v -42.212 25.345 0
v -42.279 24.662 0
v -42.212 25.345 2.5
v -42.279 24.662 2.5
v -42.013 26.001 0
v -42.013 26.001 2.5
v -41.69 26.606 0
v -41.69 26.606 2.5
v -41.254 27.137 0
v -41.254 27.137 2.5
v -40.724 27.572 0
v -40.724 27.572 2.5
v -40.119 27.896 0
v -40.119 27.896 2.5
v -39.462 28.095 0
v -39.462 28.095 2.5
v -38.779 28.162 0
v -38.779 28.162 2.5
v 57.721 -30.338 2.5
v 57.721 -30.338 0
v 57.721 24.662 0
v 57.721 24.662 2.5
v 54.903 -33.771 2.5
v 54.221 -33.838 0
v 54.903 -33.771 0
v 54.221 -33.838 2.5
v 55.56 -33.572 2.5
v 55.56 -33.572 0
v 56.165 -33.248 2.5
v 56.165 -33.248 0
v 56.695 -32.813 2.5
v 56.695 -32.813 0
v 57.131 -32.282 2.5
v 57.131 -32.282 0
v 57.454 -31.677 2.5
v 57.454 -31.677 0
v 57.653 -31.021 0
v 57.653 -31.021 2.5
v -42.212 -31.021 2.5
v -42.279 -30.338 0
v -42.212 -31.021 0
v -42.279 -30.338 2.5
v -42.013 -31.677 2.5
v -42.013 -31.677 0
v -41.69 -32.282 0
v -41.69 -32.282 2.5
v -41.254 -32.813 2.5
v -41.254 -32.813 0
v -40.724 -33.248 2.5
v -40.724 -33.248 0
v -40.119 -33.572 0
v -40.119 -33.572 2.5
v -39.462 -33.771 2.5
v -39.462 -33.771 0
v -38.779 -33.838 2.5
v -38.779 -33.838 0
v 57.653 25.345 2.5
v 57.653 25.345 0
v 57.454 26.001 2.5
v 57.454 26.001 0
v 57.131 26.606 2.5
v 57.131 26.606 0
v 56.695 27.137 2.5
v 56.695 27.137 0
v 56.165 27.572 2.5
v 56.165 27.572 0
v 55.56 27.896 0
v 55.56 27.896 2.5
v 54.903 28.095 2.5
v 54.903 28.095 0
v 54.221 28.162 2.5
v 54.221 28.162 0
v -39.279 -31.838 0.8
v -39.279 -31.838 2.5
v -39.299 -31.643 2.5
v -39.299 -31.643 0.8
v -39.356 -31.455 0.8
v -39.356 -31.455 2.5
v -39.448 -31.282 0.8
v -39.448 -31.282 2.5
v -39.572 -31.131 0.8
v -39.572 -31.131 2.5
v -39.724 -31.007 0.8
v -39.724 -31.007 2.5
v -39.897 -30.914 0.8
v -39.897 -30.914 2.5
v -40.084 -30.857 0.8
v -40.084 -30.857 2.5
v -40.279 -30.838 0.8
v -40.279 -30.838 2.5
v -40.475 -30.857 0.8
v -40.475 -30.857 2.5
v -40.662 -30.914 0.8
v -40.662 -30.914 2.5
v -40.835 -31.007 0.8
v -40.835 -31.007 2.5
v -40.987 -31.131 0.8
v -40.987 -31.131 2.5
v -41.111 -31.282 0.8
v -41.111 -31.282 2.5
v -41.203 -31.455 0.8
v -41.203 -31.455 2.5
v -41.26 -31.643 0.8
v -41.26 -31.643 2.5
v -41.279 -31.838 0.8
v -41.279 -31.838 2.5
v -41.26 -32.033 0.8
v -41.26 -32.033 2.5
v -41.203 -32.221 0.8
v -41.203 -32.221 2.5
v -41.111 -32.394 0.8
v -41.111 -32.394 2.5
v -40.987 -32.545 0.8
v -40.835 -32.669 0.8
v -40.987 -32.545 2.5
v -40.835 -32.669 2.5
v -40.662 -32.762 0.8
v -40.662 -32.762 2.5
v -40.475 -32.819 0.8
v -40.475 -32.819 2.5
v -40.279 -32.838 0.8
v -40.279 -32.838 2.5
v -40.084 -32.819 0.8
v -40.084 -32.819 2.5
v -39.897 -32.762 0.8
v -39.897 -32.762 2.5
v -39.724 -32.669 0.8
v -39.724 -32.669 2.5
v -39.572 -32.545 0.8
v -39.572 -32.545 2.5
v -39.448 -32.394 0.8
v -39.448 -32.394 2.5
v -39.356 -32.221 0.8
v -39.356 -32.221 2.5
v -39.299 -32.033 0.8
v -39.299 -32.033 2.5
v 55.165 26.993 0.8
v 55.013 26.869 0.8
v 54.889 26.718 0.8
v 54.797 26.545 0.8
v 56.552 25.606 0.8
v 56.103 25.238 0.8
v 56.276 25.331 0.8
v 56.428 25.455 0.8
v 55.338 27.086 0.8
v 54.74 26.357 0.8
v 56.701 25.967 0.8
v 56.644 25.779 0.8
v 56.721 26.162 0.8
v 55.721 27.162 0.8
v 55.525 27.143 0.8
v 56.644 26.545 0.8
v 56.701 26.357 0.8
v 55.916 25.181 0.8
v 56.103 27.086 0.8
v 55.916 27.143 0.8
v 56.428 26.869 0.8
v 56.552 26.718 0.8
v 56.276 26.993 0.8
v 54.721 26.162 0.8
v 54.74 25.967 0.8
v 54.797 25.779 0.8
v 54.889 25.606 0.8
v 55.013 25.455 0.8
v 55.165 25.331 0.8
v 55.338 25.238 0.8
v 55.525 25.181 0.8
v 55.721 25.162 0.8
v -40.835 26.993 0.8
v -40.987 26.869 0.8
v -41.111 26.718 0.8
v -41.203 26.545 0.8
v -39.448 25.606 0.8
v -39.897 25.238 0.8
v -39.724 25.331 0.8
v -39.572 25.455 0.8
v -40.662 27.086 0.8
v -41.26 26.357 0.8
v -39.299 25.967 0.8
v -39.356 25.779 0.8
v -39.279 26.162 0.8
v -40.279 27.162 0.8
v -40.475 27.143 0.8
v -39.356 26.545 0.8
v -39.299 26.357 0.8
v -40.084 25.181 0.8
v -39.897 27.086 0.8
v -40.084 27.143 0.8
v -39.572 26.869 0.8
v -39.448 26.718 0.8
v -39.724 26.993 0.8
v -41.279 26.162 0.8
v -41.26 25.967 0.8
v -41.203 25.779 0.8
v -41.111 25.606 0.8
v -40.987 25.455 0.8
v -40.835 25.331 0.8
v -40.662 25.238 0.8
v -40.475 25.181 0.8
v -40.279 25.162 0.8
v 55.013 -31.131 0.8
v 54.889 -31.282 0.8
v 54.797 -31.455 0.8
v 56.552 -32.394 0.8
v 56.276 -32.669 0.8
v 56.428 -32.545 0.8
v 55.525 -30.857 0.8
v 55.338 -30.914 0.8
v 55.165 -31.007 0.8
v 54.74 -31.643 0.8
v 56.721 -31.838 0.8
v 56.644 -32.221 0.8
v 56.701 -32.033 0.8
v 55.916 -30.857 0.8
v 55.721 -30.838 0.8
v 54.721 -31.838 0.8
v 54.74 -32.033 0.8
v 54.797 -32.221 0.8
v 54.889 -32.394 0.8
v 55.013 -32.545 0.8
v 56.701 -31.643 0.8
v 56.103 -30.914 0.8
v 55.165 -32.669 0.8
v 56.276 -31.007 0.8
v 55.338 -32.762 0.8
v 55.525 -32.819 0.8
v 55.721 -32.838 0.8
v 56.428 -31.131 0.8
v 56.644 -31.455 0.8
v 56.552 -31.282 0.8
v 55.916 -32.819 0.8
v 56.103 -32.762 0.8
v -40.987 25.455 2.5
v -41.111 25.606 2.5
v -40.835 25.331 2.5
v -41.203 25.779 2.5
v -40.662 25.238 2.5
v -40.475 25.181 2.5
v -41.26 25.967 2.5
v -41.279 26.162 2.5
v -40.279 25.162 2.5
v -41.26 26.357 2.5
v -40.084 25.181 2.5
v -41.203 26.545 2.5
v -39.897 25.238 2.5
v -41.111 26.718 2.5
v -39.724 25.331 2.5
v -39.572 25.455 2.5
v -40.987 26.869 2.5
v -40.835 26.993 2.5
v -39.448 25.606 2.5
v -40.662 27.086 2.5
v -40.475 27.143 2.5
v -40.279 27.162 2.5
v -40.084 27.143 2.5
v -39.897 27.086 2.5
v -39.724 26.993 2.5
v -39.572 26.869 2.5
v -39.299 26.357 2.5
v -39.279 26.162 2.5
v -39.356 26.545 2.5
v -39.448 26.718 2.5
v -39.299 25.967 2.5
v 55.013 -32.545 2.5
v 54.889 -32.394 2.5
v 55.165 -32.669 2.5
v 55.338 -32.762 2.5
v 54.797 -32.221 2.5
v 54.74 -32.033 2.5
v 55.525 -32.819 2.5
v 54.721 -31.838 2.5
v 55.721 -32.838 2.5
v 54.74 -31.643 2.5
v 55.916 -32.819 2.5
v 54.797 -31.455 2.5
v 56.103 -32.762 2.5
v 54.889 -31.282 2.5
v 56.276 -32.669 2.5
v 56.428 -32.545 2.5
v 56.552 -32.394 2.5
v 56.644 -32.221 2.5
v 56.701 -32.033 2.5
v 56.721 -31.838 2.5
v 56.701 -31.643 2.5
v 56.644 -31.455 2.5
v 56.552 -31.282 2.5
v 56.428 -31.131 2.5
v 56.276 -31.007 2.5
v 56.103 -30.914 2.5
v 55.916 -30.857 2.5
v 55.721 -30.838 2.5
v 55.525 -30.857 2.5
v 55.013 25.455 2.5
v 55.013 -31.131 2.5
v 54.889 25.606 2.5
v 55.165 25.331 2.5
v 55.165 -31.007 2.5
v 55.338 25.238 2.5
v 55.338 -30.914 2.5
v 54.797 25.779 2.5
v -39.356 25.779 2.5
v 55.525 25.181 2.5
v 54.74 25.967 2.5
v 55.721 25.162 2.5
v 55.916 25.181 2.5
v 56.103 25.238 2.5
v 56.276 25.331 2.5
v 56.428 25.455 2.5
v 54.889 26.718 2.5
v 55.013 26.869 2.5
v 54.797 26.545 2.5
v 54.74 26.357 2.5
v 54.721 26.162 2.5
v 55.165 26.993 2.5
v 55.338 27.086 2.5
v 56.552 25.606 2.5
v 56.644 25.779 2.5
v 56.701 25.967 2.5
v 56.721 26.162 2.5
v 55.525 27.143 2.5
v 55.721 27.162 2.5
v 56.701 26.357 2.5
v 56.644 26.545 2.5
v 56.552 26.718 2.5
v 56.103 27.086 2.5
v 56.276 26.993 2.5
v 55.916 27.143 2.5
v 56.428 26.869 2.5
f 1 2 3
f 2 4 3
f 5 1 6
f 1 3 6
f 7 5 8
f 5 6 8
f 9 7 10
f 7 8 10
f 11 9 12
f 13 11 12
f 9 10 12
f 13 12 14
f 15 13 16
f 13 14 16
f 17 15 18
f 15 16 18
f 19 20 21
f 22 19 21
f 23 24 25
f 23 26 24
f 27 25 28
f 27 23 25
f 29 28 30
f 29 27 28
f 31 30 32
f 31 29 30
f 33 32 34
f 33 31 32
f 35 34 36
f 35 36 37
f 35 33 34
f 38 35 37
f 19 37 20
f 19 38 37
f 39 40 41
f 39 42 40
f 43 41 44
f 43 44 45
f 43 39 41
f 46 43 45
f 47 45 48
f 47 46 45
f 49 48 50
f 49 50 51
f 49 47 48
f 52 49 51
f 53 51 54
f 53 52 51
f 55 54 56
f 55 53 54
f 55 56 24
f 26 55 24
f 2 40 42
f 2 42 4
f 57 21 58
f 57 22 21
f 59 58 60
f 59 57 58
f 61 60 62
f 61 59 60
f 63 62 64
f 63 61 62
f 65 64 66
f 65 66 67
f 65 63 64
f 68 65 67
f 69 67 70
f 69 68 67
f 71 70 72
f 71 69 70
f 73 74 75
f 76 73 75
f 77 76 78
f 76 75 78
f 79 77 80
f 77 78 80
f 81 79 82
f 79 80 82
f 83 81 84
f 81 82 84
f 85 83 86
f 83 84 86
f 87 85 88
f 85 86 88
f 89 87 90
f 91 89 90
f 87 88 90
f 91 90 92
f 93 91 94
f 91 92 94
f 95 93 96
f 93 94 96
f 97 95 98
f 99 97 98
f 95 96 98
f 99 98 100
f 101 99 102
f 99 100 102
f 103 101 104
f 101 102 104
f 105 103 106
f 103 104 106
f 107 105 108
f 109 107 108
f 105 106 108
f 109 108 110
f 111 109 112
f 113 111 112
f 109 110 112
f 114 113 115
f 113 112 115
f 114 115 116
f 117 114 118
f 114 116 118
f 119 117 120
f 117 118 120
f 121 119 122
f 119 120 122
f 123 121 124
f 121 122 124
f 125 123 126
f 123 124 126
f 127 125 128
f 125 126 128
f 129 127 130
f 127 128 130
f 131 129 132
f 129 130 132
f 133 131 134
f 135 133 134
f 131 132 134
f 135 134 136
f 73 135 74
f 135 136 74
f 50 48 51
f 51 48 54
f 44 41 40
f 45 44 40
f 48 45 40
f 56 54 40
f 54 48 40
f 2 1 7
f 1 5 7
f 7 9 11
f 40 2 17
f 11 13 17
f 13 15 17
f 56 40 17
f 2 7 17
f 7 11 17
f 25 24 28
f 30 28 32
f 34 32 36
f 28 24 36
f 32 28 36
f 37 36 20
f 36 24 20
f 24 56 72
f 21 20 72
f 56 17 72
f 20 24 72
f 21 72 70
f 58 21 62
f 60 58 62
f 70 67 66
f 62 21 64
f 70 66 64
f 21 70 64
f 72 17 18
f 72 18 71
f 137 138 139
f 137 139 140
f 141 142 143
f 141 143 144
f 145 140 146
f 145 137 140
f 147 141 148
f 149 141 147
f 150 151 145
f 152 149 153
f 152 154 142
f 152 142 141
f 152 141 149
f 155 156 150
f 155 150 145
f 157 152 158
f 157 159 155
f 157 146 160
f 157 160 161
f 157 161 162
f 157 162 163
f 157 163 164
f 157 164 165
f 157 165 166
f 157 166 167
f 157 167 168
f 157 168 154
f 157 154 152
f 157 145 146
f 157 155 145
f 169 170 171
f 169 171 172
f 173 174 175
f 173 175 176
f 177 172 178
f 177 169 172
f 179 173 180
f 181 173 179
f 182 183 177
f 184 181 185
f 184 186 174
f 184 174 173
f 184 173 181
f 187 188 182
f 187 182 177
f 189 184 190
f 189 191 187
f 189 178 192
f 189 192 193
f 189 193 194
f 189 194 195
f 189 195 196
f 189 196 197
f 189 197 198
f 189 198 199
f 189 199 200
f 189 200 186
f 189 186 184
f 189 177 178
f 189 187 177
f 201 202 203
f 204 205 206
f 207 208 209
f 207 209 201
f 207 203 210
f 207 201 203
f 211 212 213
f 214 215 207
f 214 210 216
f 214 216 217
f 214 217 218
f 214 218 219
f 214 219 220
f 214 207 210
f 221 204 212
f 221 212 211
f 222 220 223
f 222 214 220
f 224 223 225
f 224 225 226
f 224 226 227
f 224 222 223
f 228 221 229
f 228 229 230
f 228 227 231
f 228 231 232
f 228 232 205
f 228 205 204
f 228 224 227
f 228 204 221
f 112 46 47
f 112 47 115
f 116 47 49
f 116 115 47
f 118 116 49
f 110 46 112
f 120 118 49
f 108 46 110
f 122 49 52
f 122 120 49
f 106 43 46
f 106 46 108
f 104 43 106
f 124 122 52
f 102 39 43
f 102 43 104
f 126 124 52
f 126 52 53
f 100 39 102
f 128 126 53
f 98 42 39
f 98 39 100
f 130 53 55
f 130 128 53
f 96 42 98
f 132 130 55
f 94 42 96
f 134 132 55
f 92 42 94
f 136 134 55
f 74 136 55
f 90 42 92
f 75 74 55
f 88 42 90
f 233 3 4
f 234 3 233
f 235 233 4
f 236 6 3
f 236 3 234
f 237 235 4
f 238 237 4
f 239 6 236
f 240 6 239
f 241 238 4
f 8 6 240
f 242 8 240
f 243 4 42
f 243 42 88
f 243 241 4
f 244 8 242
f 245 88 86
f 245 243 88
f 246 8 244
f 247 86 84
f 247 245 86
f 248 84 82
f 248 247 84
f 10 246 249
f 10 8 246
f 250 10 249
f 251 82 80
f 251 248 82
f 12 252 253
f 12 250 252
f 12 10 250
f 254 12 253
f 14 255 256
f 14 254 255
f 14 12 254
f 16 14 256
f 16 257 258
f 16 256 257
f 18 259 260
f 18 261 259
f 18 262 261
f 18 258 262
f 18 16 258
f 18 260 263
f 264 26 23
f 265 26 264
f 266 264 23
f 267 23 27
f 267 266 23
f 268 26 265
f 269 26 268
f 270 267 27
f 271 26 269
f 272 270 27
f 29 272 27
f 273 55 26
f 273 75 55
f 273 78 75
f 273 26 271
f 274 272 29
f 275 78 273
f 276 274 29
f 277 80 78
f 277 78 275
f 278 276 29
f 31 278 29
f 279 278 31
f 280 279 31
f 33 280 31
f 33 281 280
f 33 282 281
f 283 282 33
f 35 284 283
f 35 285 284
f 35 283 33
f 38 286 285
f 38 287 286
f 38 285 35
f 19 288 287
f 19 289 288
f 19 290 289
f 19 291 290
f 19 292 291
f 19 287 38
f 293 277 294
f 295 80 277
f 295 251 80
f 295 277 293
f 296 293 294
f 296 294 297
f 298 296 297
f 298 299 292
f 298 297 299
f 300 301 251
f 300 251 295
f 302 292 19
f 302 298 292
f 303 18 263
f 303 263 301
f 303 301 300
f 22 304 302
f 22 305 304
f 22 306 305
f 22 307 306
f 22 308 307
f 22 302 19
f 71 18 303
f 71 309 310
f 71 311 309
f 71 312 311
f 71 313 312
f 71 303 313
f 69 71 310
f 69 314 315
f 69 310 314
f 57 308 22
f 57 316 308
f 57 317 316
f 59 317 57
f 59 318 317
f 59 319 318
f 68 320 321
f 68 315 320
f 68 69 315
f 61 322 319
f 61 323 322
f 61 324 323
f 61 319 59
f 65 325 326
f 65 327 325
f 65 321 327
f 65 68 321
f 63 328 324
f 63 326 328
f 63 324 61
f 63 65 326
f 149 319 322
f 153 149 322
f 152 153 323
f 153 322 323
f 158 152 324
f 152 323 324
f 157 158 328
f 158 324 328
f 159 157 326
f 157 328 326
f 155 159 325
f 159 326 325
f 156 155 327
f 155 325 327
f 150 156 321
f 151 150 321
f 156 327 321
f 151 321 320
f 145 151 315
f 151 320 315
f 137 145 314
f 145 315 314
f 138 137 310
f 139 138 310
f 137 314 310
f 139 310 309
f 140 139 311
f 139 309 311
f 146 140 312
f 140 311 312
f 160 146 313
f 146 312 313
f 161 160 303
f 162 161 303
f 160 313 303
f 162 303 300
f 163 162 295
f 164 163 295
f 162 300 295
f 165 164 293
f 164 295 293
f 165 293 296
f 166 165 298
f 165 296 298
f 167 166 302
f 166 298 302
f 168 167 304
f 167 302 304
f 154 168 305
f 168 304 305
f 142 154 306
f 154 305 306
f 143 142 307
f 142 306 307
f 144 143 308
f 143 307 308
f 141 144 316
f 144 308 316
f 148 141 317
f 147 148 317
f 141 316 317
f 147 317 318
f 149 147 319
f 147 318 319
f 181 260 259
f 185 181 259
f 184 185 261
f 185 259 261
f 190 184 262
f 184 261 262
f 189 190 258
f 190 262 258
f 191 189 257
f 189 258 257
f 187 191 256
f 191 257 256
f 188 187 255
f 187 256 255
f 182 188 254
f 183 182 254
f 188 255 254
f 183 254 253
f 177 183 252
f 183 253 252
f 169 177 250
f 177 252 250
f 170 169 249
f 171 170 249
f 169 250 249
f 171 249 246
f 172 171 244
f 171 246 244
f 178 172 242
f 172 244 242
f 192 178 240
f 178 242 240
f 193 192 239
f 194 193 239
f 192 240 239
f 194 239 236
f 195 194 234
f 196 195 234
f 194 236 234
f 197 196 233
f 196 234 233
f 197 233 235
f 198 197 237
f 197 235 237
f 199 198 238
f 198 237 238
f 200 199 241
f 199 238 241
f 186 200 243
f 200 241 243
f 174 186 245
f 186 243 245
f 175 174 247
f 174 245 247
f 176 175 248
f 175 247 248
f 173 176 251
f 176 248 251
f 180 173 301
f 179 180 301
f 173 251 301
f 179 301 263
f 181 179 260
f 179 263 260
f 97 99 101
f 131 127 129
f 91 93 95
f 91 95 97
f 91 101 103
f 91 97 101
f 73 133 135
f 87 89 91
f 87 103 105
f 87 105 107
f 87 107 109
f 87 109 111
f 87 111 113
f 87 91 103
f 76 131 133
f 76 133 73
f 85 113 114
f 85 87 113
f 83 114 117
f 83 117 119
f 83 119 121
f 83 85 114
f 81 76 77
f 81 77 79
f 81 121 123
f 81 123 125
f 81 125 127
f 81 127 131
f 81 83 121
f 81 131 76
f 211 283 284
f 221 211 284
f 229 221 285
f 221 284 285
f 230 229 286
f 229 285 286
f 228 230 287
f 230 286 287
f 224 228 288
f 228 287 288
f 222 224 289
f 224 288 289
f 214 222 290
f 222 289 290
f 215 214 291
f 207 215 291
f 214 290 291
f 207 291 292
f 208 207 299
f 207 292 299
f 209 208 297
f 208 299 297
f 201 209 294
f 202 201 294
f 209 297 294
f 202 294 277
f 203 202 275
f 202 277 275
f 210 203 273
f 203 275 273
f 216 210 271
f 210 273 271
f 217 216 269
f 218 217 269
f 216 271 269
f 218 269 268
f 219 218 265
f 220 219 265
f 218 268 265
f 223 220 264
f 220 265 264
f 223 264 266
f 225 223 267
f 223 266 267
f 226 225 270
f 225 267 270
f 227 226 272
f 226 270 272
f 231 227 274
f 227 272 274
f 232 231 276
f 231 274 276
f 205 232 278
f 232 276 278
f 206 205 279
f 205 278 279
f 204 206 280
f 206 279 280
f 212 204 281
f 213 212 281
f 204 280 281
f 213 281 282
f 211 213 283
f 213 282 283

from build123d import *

# Parameters (mm, degrees)
F0_W     = 100
F0_H     = 62
F1_DEPTH = 2.5
F2_R     = 3.5
F4_R     = 1
F5_DEPTH = 1.7


with BuildPart() as f1:
    # F0 (on Top) → F1 (new body)
    with BuildSketch(Plane.XY):
        with Locations((7.72059, -2.837996)):
            Rectangle(F0_W, F0_H)
    extrude(amount=F1_DEPTH)

    # F2
    f2_edges = [f1.edges().sort_by_distance(p)[0] for p in [
        (-42.27941, -33.837996, 1.25),
        (-42.27941, 28.162004, 1.25),
        (57.72059, 28.162004, 1.25),
        (57.72059, -33.837996, 1.25),
    ]]
    fillet(f2_edges, radius=F2_R)

    # F4 (on face) → F5 (cut)
    with BuildSketch(Plane.XY.offset(2.5)):
        with Locations((-40.27941, 26.162004)):
            Circle(F4_R)
        with Locations((-40.27941, -31.837996)):
            Circle(F4_R)
        with Locations((55.72059, 26.162004)):
            Circle(F4_R)
        with Locations((55.72059, -31.837996)):
            Circle(F4_R)
    extrude(amount=-F5_DEPTH, mode=Mode.SUBTRACT)


solid = f1.part
